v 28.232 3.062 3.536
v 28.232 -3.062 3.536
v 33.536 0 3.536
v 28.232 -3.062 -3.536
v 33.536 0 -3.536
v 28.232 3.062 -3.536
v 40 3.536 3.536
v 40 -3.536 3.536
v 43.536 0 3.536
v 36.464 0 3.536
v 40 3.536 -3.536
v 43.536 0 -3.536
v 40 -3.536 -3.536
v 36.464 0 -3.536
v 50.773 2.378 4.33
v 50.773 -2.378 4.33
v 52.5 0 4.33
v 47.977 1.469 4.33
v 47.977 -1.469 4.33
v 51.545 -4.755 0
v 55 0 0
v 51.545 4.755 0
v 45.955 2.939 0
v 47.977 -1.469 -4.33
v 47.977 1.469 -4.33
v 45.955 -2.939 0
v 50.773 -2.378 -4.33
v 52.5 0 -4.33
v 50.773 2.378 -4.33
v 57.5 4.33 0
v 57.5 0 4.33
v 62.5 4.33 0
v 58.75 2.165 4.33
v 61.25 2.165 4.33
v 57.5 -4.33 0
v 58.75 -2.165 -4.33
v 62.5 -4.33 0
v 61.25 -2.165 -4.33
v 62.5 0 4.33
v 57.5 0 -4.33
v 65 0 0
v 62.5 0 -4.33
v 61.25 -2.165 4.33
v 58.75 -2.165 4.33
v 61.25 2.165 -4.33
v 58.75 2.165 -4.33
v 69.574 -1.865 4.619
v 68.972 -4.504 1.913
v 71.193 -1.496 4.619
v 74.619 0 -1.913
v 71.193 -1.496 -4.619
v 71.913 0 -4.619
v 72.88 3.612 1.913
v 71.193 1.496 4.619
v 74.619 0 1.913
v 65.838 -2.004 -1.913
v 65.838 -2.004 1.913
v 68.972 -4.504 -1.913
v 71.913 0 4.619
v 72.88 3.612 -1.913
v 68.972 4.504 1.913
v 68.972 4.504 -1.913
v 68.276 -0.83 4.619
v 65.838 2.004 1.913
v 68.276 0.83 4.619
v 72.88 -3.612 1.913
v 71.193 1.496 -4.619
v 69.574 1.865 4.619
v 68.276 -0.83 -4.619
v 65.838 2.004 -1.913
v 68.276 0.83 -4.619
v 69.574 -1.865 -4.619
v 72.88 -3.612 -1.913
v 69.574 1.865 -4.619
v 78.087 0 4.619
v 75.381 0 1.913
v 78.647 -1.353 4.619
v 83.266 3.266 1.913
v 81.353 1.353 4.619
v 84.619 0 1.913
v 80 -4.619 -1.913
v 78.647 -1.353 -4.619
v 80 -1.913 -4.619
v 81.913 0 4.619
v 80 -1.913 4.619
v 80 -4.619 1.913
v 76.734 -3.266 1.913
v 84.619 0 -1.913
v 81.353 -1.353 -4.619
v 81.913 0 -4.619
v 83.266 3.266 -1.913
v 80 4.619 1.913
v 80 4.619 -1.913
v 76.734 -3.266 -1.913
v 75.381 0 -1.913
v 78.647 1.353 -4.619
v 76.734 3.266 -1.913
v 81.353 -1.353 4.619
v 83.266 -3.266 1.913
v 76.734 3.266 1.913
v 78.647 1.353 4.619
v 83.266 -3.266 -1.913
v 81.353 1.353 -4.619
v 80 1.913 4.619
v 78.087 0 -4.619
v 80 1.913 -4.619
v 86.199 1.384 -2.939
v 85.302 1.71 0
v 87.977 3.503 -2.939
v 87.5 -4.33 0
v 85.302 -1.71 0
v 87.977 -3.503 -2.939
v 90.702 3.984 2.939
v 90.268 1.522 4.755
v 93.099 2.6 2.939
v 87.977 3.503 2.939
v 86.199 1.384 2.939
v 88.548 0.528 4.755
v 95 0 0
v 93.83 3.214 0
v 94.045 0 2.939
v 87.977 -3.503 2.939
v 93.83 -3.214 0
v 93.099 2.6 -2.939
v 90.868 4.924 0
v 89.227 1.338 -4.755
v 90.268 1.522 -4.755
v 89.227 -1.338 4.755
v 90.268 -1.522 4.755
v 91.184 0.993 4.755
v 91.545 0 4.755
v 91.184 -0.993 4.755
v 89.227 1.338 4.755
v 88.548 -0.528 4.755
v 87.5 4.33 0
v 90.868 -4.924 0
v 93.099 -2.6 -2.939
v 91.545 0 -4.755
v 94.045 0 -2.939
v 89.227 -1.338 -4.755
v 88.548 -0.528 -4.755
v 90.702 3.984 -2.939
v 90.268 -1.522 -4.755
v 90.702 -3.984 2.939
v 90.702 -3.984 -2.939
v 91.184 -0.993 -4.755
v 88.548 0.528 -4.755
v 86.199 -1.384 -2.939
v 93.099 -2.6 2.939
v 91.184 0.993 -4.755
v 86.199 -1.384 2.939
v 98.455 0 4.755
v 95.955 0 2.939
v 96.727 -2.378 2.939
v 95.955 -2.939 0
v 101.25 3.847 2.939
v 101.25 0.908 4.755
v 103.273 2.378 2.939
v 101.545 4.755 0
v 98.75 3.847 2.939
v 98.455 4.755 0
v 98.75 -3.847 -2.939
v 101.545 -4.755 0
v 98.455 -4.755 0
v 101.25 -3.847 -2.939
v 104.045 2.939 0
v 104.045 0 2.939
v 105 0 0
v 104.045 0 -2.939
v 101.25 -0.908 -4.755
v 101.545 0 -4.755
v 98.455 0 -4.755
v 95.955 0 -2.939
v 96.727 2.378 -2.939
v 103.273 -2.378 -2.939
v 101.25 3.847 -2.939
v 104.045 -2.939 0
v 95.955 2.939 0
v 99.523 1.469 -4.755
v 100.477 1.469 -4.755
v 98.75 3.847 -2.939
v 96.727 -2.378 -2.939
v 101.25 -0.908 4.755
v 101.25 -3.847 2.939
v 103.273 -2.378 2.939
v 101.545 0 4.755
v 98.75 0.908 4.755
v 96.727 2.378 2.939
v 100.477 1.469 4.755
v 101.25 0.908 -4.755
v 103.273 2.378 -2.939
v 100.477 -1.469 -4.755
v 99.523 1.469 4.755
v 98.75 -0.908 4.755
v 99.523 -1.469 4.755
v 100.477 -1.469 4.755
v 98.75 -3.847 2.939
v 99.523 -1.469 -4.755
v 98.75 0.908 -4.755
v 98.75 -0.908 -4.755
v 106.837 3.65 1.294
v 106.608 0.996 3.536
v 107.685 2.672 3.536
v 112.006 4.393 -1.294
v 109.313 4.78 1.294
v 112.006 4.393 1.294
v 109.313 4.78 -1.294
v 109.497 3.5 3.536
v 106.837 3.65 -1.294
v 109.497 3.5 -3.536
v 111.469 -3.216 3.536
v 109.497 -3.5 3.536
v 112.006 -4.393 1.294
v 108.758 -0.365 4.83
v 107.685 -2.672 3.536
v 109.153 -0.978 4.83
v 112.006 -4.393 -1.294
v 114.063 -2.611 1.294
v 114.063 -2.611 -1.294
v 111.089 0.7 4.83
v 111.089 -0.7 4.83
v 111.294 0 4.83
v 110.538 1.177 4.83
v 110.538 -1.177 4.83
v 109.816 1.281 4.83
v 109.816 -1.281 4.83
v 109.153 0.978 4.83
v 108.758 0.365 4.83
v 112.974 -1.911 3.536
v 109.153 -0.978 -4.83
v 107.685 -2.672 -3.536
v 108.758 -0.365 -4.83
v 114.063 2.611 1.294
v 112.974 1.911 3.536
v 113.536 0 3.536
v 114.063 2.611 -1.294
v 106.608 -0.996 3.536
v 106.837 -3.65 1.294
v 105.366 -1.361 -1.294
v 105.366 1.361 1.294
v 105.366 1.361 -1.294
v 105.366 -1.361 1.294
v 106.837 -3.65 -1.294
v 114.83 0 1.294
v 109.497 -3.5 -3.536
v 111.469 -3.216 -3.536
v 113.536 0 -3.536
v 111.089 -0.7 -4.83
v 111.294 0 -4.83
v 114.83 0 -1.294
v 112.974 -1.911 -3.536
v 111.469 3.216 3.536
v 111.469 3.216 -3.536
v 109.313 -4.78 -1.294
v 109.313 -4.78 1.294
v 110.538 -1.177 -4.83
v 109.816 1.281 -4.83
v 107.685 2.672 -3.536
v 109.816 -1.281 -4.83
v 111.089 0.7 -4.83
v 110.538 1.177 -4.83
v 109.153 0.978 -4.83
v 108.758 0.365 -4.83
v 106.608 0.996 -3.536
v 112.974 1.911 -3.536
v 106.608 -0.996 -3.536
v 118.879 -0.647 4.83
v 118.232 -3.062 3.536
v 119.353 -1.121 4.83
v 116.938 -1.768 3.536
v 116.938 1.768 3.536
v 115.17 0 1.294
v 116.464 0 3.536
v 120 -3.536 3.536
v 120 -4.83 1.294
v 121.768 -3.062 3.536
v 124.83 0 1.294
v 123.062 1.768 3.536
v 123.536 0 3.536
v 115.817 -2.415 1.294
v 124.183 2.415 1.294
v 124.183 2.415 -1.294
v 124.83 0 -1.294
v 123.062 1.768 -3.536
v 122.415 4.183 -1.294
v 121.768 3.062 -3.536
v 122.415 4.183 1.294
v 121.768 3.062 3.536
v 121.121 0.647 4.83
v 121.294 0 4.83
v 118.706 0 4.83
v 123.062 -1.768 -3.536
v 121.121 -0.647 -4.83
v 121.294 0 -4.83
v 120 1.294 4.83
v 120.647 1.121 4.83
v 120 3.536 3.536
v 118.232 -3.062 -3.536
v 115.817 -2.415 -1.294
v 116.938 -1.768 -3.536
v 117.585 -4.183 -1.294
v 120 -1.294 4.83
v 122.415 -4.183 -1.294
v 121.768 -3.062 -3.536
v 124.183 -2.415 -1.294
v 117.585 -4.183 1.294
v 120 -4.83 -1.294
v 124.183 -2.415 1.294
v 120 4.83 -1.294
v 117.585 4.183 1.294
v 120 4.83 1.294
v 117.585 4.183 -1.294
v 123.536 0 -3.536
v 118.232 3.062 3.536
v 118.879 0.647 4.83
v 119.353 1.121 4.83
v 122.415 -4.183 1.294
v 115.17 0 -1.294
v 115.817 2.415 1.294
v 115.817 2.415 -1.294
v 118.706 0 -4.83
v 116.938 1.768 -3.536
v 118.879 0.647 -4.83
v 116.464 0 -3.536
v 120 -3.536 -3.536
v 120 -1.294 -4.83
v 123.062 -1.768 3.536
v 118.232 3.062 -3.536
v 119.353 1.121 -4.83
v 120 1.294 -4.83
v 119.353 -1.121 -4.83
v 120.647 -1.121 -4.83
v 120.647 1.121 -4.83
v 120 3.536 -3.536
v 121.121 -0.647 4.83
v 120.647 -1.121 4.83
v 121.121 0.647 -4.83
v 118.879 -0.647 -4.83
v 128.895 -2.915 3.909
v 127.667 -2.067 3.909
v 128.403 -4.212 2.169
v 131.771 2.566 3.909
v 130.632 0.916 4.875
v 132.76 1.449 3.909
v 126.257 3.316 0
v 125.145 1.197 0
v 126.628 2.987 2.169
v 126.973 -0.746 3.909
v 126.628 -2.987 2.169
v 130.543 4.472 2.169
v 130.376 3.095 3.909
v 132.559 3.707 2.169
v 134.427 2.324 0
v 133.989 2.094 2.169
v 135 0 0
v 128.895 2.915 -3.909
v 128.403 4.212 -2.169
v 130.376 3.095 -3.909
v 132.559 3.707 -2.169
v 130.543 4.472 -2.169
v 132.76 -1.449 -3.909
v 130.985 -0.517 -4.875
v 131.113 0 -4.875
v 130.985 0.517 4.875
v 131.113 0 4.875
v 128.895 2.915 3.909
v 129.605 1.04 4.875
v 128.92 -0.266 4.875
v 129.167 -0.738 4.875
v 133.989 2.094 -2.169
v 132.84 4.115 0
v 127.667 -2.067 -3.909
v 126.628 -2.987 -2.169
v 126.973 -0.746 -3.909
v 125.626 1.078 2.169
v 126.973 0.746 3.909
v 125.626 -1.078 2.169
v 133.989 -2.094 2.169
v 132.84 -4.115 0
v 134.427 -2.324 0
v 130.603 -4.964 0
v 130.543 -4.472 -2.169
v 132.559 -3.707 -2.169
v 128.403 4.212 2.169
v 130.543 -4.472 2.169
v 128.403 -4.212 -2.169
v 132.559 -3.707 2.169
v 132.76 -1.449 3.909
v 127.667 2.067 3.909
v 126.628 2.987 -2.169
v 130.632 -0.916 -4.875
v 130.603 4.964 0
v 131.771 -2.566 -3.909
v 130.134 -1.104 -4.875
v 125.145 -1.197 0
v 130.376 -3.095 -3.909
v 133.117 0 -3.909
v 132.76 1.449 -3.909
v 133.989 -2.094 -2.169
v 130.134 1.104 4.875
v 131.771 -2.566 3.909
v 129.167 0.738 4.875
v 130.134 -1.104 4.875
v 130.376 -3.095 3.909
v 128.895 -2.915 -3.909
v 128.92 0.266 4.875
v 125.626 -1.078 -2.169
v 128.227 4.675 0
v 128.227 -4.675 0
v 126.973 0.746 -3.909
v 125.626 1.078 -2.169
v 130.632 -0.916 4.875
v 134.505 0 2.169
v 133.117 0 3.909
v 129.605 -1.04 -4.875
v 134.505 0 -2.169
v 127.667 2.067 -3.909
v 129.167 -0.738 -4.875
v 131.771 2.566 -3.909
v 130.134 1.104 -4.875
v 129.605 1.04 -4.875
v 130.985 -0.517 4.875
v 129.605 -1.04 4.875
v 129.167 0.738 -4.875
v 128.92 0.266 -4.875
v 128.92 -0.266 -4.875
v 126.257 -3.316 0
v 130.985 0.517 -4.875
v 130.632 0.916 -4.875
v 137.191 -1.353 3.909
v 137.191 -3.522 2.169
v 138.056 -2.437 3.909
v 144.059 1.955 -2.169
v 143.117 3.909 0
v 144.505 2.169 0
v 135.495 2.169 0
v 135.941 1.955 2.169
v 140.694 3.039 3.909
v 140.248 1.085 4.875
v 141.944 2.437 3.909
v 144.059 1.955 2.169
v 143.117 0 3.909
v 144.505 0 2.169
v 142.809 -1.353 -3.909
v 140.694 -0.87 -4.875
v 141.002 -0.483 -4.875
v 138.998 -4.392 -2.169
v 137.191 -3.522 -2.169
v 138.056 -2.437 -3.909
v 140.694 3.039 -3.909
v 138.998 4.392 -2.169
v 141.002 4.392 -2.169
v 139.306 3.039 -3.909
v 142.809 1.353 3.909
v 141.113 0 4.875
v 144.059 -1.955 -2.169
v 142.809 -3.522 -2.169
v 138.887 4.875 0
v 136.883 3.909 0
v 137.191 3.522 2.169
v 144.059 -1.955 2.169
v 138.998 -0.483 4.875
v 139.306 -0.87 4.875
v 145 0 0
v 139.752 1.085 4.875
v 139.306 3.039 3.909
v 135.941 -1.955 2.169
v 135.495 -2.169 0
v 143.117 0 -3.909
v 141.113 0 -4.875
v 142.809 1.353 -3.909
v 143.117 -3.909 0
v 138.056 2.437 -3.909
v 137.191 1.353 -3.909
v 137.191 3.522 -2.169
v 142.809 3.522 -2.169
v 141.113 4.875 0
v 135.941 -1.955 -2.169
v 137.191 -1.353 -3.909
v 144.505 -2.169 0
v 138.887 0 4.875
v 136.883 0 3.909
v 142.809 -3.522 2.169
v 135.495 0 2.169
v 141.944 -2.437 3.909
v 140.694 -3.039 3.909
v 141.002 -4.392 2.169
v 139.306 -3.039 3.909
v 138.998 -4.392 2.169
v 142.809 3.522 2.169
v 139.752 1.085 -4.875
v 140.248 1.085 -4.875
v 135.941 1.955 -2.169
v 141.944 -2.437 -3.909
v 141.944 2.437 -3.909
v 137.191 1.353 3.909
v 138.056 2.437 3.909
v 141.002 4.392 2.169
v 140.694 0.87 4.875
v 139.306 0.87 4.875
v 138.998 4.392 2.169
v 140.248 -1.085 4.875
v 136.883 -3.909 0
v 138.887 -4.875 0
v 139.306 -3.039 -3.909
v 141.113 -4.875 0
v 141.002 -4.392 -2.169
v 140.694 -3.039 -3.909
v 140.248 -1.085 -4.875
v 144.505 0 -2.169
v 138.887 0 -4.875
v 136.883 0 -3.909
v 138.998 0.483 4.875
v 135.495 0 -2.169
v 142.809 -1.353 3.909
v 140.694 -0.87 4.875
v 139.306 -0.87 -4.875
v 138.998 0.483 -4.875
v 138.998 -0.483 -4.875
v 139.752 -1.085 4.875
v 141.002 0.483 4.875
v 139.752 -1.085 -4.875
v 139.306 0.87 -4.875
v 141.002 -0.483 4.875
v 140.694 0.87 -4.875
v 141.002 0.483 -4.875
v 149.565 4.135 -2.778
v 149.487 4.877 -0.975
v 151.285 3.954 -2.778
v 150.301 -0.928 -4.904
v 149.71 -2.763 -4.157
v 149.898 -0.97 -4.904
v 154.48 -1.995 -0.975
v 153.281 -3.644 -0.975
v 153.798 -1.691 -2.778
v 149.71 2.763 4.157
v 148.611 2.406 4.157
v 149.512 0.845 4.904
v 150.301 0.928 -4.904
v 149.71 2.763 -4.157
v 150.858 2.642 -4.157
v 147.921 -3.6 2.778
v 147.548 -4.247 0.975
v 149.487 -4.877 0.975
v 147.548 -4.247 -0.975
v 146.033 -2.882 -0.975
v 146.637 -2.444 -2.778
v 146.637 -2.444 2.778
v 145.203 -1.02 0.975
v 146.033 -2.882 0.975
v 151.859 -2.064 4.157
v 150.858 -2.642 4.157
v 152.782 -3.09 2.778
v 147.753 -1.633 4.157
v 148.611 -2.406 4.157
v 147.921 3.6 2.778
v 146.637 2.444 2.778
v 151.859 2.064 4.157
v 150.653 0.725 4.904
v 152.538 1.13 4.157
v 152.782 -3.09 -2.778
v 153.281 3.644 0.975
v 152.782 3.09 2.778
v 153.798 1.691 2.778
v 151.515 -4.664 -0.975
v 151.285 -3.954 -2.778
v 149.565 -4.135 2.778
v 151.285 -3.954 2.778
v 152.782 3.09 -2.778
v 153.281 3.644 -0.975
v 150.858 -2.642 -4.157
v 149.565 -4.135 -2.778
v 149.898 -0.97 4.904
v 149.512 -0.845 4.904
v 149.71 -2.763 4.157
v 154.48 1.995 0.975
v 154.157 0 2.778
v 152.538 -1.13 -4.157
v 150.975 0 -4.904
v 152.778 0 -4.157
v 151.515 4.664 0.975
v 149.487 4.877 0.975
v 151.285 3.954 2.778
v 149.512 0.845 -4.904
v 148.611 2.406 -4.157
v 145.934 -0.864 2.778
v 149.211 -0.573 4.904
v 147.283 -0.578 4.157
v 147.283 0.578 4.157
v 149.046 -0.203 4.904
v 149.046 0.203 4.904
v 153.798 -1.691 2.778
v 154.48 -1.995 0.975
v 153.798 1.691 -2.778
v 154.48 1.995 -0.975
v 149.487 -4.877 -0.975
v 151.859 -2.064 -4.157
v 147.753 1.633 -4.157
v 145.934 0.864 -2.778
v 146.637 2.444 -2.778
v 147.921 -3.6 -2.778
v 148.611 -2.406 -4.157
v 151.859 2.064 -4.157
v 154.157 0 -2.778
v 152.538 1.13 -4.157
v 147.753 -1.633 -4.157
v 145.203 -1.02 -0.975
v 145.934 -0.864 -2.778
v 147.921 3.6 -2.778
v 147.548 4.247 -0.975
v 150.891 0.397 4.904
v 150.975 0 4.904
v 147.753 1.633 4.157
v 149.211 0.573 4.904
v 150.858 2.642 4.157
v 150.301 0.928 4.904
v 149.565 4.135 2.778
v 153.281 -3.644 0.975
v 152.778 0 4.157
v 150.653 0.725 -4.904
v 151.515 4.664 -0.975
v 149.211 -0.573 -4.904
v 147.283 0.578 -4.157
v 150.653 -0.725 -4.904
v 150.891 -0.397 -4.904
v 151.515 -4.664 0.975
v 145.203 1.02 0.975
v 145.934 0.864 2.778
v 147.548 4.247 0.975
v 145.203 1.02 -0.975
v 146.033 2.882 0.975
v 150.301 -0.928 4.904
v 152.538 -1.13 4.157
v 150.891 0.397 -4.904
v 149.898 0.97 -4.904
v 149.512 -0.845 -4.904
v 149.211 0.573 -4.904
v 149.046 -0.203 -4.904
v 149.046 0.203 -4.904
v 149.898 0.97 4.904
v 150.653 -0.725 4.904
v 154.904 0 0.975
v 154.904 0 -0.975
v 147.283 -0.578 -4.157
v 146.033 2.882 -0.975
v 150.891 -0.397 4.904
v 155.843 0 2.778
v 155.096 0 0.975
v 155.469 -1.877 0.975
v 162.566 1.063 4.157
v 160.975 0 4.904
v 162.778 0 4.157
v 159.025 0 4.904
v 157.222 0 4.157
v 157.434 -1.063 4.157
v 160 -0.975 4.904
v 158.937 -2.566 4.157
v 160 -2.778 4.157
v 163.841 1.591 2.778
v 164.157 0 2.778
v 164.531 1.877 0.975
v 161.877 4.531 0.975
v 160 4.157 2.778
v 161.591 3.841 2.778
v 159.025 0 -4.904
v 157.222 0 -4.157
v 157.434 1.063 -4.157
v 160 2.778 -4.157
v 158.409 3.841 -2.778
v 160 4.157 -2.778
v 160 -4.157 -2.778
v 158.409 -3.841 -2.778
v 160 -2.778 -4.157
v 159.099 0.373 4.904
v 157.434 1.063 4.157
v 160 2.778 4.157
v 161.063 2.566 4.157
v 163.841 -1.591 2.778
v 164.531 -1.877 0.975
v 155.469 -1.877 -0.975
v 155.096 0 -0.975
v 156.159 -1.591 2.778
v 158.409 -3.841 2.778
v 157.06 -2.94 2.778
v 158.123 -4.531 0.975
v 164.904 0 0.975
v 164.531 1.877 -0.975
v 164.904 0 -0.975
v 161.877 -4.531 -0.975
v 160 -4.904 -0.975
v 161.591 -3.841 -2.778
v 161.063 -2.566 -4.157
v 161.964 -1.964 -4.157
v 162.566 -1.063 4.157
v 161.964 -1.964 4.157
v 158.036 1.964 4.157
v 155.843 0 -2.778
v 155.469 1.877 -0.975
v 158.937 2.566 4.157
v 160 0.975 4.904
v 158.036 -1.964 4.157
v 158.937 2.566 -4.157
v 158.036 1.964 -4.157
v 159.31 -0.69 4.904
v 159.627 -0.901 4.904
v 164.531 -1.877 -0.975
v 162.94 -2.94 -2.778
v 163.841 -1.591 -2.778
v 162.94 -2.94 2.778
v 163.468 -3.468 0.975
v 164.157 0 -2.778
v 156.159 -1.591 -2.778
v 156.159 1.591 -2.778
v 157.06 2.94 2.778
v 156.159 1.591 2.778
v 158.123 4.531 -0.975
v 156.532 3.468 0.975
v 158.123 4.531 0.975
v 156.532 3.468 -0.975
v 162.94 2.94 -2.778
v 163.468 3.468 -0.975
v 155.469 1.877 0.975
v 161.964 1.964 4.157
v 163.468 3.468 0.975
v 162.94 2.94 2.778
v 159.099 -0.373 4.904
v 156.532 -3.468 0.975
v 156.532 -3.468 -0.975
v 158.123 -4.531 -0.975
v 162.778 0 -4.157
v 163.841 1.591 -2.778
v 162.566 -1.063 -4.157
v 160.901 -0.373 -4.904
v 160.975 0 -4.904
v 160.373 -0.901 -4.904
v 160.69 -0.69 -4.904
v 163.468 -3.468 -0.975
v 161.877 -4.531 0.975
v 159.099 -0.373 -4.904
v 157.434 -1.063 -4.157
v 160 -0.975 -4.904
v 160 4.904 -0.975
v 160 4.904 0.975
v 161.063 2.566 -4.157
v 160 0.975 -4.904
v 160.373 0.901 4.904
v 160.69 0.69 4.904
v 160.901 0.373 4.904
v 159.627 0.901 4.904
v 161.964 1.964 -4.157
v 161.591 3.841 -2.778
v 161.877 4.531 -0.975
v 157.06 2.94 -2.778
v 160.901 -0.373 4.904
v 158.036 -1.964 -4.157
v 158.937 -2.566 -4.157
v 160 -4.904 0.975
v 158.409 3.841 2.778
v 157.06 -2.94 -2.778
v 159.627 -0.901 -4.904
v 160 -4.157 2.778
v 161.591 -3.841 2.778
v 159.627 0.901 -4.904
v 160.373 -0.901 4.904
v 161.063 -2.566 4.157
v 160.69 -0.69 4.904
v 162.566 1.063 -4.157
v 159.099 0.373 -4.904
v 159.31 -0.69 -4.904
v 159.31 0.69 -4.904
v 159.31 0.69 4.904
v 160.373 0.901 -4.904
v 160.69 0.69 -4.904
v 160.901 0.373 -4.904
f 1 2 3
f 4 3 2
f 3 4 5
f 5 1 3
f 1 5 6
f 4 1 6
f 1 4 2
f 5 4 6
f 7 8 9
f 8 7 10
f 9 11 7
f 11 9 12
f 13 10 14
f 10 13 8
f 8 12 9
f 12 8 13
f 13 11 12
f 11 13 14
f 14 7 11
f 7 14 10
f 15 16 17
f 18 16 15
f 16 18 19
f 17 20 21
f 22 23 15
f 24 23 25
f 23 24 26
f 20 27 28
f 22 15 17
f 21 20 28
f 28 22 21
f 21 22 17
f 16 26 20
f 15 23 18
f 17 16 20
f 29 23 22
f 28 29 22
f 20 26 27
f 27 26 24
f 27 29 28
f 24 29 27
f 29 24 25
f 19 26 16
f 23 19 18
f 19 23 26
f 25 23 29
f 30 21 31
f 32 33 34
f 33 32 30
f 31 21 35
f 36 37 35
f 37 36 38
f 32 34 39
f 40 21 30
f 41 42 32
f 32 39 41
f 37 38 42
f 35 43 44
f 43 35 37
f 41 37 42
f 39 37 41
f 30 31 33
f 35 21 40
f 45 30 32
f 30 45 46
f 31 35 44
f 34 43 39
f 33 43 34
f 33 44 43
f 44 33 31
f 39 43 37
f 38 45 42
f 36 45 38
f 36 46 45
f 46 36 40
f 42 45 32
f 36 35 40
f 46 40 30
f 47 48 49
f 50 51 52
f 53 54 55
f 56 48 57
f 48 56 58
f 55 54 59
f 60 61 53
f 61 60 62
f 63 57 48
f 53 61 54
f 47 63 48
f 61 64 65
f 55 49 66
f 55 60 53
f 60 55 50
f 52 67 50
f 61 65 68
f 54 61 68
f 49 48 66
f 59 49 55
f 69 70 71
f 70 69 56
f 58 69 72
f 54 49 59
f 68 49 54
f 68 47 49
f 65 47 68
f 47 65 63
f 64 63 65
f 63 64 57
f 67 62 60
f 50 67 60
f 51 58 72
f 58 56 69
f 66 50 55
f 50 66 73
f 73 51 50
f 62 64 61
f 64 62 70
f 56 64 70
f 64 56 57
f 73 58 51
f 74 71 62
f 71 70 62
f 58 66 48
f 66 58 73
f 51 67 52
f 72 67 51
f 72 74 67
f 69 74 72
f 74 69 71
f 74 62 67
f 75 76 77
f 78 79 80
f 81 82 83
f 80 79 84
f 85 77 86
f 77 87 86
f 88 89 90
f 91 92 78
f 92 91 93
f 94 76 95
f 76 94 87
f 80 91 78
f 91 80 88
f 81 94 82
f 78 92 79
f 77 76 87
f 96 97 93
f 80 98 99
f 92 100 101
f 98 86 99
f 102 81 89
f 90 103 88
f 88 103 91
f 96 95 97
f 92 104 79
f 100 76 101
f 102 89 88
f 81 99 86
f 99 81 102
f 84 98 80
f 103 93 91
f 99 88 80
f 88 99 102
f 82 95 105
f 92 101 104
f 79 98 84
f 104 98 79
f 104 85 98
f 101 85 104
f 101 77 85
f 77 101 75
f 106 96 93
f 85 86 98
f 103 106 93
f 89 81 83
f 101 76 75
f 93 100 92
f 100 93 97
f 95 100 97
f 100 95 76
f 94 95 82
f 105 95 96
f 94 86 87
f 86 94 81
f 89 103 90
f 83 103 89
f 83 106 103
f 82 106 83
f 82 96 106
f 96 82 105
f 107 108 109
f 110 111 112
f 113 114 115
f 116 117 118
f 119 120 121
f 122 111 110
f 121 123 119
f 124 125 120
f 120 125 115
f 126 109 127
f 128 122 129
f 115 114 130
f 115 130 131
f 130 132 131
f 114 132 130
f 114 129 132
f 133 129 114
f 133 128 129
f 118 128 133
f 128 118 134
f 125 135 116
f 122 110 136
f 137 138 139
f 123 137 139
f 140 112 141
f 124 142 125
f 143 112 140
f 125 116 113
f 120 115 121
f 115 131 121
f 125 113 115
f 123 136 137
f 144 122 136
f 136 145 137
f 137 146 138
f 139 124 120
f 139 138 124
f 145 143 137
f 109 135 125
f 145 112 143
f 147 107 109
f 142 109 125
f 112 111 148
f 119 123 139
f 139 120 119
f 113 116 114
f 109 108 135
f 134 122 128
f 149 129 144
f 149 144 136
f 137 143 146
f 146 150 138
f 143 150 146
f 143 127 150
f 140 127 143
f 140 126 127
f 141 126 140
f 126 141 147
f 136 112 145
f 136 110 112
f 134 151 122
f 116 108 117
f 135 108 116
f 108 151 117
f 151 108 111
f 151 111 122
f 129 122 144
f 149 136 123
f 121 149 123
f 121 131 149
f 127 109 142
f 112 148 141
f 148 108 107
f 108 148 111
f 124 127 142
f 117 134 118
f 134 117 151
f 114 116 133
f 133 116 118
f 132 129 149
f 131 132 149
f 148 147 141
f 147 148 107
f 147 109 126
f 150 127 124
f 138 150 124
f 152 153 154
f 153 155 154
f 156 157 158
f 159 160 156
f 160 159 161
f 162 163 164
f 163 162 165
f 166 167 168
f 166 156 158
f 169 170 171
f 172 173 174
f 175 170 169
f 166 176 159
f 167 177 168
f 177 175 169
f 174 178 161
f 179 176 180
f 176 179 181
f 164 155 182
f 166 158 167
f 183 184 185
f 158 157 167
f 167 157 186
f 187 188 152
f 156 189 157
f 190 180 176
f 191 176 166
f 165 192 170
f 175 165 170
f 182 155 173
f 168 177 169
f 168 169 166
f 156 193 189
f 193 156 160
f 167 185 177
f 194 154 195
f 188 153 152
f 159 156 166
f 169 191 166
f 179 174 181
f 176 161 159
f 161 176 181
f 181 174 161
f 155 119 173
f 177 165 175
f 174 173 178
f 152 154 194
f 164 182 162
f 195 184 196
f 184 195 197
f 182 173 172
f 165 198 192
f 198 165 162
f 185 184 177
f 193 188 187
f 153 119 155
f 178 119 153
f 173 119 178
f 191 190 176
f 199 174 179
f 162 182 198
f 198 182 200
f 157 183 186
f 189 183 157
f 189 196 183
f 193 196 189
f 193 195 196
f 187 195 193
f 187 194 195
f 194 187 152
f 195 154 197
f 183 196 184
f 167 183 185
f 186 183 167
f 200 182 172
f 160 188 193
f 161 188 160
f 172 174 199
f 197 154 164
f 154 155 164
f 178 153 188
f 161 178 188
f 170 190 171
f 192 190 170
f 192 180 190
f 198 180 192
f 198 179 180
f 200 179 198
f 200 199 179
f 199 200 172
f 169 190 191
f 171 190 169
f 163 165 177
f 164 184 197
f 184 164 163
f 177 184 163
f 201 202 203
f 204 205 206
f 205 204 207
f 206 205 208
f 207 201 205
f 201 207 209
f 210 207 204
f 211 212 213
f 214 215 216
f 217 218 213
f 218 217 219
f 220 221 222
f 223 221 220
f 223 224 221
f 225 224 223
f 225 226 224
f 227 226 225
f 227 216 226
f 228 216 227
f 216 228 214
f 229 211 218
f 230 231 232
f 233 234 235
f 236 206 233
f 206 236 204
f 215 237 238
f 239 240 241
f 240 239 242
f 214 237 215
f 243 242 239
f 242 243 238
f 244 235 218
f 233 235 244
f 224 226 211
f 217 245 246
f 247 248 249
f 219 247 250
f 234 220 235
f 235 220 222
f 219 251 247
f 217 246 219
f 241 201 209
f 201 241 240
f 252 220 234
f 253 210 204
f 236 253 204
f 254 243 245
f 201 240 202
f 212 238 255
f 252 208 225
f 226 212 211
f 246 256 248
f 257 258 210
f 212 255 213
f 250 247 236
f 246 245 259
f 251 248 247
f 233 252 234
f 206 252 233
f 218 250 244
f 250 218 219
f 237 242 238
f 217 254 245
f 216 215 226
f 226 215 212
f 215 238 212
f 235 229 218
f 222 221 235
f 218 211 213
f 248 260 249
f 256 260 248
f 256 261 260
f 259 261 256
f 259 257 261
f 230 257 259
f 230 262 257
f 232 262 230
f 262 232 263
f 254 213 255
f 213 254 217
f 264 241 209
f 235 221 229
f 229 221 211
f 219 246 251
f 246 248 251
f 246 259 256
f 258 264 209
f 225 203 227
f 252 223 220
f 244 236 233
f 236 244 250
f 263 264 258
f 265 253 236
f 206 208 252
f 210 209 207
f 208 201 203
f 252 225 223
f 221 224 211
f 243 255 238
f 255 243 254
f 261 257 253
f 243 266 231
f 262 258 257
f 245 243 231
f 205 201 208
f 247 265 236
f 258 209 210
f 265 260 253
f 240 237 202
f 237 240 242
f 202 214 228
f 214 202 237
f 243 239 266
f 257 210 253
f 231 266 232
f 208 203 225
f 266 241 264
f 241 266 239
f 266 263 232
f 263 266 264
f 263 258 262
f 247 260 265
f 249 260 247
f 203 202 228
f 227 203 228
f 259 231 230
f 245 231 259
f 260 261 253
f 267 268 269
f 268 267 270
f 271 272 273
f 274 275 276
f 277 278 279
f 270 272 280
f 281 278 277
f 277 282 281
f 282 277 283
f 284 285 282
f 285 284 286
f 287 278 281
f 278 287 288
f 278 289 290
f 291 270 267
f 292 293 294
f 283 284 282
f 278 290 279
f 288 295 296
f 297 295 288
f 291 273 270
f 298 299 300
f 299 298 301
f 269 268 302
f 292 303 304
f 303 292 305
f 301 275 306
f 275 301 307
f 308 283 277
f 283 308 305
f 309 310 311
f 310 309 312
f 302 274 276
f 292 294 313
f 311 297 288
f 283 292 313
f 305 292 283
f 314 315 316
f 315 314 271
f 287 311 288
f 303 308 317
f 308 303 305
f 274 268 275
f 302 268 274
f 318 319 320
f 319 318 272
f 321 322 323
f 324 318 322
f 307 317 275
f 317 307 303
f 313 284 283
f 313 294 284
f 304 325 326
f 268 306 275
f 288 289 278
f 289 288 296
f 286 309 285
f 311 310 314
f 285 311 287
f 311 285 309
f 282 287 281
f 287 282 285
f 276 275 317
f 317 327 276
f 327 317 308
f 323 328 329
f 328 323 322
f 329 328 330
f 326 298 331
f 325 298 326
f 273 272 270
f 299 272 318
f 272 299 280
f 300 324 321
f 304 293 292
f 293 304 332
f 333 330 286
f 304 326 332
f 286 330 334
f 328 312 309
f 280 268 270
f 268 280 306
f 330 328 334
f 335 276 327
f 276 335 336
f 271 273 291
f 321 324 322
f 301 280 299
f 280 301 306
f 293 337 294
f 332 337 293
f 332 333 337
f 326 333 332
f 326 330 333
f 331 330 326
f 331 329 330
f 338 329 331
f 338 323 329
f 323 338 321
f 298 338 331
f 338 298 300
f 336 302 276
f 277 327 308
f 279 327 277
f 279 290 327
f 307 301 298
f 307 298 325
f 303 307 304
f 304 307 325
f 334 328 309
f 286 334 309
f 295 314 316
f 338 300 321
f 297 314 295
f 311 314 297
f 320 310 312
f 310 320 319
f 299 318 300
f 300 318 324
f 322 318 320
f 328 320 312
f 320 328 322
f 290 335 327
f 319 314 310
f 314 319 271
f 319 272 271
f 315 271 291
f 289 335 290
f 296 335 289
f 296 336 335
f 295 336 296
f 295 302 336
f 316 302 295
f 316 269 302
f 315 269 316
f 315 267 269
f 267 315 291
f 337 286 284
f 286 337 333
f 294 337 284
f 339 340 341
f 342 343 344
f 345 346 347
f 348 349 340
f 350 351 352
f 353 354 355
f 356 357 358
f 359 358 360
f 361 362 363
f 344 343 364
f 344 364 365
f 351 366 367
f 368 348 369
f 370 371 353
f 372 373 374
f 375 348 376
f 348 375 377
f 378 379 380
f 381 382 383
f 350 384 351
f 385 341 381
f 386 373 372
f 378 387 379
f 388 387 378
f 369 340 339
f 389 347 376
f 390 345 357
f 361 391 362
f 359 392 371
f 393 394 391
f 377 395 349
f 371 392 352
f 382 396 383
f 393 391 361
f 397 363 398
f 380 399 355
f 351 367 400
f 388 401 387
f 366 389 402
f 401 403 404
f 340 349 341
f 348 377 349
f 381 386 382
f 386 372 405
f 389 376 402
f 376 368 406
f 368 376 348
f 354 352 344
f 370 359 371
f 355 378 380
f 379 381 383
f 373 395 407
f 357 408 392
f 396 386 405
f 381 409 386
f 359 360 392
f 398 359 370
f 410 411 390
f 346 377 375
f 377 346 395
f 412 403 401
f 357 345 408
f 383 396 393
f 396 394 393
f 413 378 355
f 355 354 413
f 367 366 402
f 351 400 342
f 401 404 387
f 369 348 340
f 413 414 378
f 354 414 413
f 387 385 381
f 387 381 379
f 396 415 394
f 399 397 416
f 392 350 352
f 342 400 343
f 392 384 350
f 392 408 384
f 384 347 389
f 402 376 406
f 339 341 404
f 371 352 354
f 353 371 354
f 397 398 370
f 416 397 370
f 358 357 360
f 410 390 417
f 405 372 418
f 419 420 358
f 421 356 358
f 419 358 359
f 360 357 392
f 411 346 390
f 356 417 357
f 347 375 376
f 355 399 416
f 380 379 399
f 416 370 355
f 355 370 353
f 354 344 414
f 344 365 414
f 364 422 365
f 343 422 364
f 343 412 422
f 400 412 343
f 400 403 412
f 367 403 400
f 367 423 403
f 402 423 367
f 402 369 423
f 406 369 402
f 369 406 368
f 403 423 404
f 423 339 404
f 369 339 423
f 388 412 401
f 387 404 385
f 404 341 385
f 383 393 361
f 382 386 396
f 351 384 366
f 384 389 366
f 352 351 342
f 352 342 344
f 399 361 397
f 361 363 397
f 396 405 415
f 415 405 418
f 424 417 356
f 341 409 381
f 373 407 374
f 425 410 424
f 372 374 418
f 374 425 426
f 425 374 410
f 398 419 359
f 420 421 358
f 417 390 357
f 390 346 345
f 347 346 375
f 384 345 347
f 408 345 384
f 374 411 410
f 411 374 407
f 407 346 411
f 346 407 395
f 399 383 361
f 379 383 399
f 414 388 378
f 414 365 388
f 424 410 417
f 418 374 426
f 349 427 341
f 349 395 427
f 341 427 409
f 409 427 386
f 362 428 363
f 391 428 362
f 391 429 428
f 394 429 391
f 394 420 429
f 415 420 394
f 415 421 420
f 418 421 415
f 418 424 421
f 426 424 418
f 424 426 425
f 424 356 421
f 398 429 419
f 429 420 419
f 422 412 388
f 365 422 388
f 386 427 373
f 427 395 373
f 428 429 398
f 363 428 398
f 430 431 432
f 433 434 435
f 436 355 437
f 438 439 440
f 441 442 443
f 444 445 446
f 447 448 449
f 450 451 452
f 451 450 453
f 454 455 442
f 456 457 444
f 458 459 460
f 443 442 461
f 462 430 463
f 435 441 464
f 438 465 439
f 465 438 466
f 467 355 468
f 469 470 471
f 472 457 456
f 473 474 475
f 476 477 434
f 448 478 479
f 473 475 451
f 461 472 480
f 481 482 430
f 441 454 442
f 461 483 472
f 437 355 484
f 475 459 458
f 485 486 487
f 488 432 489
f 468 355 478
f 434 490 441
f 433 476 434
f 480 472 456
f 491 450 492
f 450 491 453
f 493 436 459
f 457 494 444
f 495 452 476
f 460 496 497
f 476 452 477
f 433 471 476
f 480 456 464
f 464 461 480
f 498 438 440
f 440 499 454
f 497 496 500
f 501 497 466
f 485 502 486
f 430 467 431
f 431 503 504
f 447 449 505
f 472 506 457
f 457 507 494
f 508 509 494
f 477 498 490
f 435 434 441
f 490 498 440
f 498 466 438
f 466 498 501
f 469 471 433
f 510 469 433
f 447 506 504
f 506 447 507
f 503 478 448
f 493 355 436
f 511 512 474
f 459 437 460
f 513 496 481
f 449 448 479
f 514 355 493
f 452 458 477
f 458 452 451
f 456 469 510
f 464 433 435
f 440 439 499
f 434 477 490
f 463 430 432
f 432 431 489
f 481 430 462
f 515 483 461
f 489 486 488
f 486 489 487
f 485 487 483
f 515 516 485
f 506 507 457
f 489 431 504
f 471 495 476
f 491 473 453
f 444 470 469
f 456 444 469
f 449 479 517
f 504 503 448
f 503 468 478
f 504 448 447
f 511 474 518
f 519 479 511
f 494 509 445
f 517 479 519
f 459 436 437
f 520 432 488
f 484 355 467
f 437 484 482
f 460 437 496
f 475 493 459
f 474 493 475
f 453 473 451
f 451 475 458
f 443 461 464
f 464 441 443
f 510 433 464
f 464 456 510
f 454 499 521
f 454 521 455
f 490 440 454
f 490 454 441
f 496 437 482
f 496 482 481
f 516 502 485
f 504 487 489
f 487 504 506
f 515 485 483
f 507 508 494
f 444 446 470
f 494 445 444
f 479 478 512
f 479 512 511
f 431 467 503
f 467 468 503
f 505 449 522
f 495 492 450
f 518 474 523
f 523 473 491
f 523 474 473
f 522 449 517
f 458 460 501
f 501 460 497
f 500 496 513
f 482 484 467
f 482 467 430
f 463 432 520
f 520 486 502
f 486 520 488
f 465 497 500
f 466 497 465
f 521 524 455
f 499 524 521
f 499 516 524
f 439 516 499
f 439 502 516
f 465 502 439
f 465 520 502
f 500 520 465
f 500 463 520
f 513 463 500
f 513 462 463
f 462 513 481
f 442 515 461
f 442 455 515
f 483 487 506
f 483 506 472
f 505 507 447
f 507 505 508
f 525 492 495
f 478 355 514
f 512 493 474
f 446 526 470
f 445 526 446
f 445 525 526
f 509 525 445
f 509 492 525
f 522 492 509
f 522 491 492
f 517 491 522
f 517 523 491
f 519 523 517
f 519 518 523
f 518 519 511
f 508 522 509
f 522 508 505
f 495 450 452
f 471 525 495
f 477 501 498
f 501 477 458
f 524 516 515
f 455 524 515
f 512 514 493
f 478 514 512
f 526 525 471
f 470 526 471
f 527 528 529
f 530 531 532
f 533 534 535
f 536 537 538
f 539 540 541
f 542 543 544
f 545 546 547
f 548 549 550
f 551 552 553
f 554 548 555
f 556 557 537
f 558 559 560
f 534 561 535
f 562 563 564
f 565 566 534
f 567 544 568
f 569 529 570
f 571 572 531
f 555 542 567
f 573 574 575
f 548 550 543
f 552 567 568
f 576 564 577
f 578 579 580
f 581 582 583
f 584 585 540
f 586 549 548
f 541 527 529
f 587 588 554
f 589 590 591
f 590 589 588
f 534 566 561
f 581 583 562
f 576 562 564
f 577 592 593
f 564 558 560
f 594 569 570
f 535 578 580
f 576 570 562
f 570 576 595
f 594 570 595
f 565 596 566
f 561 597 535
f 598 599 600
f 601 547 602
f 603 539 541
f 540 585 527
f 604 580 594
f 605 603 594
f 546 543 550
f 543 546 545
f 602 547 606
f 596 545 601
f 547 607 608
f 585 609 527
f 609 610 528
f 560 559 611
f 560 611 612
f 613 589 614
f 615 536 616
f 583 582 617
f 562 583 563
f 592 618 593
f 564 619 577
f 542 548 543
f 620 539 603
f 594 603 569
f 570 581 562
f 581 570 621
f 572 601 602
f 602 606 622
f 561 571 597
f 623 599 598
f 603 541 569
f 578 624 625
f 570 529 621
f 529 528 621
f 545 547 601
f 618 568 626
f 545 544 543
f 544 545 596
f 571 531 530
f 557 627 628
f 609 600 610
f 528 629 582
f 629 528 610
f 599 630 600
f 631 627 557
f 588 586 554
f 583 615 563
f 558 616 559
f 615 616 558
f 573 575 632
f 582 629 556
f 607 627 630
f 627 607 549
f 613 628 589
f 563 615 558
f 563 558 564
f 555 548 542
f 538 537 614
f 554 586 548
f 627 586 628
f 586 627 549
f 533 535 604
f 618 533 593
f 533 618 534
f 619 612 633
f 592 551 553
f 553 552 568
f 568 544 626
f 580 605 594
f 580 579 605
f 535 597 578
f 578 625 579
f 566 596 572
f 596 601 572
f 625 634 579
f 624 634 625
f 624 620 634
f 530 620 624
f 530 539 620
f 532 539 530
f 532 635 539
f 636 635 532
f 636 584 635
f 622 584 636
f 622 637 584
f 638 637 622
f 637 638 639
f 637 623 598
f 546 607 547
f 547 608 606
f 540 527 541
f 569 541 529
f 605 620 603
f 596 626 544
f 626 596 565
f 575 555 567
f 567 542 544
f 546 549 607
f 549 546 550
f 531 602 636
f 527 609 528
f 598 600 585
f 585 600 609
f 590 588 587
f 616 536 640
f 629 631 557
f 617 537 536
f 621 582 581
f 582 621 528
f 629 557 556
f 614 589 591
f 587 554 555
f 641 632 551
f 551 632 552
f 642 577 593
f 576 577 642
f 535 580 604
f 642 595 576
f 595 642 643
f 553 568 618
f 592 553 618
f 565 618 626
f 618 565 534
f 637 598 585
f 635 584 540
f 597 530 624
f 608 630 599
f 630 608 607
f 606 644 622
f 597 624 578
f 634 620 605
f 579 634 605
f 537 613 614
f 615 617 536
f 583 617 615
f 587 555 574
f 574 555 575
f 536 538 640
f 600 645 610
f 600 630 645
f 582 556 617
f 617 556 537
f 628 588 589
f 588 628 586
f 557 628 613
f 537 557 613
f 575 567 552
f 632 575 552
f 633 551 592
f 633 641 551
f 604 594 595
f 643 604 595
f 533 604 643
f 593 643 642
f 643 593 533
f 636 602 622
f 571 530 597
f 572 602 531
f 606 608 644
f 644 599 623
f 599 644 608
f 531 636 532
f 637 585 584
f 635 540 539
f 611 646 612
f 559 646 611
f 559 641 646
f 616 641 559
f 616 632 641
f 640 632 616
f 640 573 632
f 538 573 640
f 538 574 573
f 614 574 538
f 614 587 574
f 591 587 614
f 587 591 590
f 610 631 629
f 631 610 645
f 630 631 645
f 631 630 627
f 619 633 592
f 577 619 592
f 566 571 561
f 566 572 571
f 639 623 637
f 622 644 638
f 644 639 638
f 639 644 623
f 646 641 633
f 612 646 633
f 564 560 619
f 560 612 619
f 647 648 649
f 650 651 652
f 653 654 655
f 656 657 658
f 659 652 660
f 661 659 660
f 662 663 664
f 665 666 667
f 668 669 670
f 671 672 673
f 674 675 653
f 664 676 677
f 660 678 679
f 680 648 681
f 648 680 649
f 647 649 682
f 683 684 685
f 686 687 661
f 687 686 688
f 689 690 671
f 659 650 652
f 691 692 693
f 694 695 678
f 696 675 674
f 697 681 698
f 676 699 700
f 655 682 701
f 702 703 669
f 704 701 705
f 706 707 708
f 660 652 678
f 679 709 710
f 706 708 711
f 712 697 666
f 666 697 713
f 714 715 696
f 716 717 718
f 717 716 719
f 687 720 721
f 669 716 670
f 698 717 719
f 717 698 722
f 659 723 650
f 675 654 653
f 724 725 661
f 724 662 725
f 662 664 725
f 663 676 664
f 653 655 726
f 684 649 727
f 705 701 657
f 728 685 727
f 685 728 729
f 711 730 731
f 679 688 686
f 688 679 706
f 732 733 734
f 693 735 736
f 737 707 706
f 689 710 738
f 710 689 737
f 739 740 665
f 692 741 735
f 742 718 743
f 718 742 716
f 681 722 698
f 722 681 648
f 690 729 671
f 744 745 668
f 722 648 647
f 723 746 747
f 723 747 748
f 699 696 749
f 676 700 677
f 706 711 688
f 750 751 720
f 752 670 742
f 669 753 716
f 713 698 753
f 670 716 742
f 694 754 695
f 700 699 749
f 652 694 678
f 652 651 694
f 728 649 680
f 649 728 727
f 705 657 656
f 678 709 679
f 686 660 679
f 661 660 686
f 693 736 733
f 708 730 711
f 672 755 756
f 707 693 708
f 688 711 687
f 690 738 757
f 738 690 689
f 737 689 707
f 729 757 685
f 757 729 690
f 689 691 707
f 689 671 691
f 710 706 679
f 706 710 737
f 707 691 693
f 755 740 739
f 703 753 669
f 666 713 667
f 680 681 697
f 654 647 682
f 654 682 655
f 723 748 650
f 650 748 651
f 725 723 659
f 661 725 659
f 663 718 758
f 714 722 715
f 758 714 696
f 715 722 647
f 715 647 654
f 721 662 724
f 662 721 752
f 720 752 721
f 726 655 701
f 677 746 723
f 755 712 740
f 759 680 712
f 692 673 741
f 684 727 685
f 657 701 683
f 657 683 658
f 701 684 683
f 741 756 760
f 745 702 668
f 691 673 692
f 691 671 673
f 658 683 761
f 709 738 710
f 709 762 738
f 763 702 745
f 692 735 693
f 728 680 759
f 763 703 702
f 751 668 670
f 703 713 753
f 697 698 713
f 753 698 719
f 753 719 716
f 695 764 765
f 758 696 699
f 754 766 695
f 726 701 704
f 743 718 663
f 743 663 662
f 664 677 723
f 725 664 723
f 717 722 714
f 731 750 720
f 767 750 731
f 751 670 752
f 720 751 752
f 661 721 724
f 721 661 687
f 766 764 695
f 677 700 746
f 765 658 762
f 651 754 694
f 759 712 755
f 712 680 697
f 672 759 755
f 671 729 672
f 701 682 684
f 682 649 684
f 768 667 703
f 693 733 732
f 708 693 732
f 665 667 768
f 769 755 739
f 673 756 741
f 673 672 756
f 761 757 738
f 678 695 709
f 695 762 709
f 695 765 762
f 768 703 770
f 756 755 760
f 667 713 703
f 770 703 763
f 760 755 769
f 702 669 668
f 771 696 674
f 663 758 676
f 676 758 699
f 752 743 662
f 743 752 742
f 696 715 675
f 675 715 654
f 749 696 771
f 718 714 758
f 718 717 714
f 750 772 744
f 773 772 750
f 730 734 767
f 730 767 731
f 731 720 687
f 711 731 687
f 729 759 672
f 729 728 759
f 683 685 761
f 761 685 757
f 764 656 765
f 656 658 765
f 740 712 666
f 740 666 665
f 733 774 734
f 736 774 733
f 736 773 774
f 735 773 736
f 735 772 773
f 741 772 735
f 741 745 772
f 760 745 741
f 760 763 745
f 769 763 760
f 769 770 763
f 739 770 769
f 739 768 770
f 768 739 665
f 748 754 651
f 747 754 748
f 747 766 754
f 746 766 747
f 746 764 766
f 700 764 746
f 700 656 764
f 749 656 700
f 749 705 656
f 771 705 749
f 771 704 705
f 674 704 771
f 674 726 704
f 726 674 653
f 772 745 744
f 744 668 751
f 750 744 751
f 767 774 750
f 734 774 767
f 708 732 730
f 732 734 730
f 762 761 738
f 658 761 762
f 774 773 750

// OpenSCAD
for(faces=[3:1:16]) {
	$fn = faces;
	x = 10*faces;
	translate([x, 0, 0]) sphere(r=5);
	echo("faces:", faces, "x-position:", x);
}
